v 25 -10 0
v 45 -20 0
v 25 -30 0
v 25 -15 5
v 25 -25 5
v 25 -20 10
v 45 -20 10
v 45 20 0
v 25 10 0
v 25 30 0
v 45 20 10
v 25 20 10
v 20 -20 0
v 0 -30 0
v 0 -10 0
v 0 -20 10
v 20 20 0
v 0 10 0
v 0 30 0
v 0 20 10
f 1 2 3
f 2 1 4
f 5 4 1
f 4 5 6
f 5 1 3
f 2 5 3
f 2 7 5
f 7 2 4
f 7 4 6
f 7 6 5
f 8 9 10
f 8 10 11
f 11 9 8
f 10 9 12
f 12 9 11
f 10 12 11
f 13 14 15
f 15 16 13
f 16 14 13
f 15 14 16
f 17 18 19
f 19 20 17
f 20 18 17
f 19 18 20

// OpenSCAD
$fn = 3; // don't split triangles into segments

// linear_extrude tests with scale to 0 on different axes.
// Test updated with additional cases for PR #3351 - Hans Loeblich
module tri() { polygon([[20, 0],[0, 10],[0, -10]]); }

// Original test had the following single geometry:
translate([ 25,-20]) linear_extrude(height = 10, scale = [1,0], slices = 2) tri();
// Newly added cases:
translate([ 25, 20]) linear_extrude(height = 10, scale = [1,0], slices = 1) tri();
translate([  0,-20]) linear_extrude(height = 10, scale = [0,0], slices = 2) tri();
translate([  0, 20]) linear_extrude(height = 10, scale = [0,0], slices = 1) tri();

// FIXME: the following two cases preview ok, but render with non-manifold warning.
// TEST_GENERATE only makes blank images for monotonepngtest and stlcgalpngtest
// while the "actual" images contain all objects, so those tests fail.
// I think export/import is involved in generating those expected images and that's failing?
/*
translate([-25,-20]) linear_extrude(height = 10, scale = [0,1], slices = 2) tri();
translate([-25, 20]) linear_extrude(height = 10, scale = [0,1], slices = 1) tri();
//*/
